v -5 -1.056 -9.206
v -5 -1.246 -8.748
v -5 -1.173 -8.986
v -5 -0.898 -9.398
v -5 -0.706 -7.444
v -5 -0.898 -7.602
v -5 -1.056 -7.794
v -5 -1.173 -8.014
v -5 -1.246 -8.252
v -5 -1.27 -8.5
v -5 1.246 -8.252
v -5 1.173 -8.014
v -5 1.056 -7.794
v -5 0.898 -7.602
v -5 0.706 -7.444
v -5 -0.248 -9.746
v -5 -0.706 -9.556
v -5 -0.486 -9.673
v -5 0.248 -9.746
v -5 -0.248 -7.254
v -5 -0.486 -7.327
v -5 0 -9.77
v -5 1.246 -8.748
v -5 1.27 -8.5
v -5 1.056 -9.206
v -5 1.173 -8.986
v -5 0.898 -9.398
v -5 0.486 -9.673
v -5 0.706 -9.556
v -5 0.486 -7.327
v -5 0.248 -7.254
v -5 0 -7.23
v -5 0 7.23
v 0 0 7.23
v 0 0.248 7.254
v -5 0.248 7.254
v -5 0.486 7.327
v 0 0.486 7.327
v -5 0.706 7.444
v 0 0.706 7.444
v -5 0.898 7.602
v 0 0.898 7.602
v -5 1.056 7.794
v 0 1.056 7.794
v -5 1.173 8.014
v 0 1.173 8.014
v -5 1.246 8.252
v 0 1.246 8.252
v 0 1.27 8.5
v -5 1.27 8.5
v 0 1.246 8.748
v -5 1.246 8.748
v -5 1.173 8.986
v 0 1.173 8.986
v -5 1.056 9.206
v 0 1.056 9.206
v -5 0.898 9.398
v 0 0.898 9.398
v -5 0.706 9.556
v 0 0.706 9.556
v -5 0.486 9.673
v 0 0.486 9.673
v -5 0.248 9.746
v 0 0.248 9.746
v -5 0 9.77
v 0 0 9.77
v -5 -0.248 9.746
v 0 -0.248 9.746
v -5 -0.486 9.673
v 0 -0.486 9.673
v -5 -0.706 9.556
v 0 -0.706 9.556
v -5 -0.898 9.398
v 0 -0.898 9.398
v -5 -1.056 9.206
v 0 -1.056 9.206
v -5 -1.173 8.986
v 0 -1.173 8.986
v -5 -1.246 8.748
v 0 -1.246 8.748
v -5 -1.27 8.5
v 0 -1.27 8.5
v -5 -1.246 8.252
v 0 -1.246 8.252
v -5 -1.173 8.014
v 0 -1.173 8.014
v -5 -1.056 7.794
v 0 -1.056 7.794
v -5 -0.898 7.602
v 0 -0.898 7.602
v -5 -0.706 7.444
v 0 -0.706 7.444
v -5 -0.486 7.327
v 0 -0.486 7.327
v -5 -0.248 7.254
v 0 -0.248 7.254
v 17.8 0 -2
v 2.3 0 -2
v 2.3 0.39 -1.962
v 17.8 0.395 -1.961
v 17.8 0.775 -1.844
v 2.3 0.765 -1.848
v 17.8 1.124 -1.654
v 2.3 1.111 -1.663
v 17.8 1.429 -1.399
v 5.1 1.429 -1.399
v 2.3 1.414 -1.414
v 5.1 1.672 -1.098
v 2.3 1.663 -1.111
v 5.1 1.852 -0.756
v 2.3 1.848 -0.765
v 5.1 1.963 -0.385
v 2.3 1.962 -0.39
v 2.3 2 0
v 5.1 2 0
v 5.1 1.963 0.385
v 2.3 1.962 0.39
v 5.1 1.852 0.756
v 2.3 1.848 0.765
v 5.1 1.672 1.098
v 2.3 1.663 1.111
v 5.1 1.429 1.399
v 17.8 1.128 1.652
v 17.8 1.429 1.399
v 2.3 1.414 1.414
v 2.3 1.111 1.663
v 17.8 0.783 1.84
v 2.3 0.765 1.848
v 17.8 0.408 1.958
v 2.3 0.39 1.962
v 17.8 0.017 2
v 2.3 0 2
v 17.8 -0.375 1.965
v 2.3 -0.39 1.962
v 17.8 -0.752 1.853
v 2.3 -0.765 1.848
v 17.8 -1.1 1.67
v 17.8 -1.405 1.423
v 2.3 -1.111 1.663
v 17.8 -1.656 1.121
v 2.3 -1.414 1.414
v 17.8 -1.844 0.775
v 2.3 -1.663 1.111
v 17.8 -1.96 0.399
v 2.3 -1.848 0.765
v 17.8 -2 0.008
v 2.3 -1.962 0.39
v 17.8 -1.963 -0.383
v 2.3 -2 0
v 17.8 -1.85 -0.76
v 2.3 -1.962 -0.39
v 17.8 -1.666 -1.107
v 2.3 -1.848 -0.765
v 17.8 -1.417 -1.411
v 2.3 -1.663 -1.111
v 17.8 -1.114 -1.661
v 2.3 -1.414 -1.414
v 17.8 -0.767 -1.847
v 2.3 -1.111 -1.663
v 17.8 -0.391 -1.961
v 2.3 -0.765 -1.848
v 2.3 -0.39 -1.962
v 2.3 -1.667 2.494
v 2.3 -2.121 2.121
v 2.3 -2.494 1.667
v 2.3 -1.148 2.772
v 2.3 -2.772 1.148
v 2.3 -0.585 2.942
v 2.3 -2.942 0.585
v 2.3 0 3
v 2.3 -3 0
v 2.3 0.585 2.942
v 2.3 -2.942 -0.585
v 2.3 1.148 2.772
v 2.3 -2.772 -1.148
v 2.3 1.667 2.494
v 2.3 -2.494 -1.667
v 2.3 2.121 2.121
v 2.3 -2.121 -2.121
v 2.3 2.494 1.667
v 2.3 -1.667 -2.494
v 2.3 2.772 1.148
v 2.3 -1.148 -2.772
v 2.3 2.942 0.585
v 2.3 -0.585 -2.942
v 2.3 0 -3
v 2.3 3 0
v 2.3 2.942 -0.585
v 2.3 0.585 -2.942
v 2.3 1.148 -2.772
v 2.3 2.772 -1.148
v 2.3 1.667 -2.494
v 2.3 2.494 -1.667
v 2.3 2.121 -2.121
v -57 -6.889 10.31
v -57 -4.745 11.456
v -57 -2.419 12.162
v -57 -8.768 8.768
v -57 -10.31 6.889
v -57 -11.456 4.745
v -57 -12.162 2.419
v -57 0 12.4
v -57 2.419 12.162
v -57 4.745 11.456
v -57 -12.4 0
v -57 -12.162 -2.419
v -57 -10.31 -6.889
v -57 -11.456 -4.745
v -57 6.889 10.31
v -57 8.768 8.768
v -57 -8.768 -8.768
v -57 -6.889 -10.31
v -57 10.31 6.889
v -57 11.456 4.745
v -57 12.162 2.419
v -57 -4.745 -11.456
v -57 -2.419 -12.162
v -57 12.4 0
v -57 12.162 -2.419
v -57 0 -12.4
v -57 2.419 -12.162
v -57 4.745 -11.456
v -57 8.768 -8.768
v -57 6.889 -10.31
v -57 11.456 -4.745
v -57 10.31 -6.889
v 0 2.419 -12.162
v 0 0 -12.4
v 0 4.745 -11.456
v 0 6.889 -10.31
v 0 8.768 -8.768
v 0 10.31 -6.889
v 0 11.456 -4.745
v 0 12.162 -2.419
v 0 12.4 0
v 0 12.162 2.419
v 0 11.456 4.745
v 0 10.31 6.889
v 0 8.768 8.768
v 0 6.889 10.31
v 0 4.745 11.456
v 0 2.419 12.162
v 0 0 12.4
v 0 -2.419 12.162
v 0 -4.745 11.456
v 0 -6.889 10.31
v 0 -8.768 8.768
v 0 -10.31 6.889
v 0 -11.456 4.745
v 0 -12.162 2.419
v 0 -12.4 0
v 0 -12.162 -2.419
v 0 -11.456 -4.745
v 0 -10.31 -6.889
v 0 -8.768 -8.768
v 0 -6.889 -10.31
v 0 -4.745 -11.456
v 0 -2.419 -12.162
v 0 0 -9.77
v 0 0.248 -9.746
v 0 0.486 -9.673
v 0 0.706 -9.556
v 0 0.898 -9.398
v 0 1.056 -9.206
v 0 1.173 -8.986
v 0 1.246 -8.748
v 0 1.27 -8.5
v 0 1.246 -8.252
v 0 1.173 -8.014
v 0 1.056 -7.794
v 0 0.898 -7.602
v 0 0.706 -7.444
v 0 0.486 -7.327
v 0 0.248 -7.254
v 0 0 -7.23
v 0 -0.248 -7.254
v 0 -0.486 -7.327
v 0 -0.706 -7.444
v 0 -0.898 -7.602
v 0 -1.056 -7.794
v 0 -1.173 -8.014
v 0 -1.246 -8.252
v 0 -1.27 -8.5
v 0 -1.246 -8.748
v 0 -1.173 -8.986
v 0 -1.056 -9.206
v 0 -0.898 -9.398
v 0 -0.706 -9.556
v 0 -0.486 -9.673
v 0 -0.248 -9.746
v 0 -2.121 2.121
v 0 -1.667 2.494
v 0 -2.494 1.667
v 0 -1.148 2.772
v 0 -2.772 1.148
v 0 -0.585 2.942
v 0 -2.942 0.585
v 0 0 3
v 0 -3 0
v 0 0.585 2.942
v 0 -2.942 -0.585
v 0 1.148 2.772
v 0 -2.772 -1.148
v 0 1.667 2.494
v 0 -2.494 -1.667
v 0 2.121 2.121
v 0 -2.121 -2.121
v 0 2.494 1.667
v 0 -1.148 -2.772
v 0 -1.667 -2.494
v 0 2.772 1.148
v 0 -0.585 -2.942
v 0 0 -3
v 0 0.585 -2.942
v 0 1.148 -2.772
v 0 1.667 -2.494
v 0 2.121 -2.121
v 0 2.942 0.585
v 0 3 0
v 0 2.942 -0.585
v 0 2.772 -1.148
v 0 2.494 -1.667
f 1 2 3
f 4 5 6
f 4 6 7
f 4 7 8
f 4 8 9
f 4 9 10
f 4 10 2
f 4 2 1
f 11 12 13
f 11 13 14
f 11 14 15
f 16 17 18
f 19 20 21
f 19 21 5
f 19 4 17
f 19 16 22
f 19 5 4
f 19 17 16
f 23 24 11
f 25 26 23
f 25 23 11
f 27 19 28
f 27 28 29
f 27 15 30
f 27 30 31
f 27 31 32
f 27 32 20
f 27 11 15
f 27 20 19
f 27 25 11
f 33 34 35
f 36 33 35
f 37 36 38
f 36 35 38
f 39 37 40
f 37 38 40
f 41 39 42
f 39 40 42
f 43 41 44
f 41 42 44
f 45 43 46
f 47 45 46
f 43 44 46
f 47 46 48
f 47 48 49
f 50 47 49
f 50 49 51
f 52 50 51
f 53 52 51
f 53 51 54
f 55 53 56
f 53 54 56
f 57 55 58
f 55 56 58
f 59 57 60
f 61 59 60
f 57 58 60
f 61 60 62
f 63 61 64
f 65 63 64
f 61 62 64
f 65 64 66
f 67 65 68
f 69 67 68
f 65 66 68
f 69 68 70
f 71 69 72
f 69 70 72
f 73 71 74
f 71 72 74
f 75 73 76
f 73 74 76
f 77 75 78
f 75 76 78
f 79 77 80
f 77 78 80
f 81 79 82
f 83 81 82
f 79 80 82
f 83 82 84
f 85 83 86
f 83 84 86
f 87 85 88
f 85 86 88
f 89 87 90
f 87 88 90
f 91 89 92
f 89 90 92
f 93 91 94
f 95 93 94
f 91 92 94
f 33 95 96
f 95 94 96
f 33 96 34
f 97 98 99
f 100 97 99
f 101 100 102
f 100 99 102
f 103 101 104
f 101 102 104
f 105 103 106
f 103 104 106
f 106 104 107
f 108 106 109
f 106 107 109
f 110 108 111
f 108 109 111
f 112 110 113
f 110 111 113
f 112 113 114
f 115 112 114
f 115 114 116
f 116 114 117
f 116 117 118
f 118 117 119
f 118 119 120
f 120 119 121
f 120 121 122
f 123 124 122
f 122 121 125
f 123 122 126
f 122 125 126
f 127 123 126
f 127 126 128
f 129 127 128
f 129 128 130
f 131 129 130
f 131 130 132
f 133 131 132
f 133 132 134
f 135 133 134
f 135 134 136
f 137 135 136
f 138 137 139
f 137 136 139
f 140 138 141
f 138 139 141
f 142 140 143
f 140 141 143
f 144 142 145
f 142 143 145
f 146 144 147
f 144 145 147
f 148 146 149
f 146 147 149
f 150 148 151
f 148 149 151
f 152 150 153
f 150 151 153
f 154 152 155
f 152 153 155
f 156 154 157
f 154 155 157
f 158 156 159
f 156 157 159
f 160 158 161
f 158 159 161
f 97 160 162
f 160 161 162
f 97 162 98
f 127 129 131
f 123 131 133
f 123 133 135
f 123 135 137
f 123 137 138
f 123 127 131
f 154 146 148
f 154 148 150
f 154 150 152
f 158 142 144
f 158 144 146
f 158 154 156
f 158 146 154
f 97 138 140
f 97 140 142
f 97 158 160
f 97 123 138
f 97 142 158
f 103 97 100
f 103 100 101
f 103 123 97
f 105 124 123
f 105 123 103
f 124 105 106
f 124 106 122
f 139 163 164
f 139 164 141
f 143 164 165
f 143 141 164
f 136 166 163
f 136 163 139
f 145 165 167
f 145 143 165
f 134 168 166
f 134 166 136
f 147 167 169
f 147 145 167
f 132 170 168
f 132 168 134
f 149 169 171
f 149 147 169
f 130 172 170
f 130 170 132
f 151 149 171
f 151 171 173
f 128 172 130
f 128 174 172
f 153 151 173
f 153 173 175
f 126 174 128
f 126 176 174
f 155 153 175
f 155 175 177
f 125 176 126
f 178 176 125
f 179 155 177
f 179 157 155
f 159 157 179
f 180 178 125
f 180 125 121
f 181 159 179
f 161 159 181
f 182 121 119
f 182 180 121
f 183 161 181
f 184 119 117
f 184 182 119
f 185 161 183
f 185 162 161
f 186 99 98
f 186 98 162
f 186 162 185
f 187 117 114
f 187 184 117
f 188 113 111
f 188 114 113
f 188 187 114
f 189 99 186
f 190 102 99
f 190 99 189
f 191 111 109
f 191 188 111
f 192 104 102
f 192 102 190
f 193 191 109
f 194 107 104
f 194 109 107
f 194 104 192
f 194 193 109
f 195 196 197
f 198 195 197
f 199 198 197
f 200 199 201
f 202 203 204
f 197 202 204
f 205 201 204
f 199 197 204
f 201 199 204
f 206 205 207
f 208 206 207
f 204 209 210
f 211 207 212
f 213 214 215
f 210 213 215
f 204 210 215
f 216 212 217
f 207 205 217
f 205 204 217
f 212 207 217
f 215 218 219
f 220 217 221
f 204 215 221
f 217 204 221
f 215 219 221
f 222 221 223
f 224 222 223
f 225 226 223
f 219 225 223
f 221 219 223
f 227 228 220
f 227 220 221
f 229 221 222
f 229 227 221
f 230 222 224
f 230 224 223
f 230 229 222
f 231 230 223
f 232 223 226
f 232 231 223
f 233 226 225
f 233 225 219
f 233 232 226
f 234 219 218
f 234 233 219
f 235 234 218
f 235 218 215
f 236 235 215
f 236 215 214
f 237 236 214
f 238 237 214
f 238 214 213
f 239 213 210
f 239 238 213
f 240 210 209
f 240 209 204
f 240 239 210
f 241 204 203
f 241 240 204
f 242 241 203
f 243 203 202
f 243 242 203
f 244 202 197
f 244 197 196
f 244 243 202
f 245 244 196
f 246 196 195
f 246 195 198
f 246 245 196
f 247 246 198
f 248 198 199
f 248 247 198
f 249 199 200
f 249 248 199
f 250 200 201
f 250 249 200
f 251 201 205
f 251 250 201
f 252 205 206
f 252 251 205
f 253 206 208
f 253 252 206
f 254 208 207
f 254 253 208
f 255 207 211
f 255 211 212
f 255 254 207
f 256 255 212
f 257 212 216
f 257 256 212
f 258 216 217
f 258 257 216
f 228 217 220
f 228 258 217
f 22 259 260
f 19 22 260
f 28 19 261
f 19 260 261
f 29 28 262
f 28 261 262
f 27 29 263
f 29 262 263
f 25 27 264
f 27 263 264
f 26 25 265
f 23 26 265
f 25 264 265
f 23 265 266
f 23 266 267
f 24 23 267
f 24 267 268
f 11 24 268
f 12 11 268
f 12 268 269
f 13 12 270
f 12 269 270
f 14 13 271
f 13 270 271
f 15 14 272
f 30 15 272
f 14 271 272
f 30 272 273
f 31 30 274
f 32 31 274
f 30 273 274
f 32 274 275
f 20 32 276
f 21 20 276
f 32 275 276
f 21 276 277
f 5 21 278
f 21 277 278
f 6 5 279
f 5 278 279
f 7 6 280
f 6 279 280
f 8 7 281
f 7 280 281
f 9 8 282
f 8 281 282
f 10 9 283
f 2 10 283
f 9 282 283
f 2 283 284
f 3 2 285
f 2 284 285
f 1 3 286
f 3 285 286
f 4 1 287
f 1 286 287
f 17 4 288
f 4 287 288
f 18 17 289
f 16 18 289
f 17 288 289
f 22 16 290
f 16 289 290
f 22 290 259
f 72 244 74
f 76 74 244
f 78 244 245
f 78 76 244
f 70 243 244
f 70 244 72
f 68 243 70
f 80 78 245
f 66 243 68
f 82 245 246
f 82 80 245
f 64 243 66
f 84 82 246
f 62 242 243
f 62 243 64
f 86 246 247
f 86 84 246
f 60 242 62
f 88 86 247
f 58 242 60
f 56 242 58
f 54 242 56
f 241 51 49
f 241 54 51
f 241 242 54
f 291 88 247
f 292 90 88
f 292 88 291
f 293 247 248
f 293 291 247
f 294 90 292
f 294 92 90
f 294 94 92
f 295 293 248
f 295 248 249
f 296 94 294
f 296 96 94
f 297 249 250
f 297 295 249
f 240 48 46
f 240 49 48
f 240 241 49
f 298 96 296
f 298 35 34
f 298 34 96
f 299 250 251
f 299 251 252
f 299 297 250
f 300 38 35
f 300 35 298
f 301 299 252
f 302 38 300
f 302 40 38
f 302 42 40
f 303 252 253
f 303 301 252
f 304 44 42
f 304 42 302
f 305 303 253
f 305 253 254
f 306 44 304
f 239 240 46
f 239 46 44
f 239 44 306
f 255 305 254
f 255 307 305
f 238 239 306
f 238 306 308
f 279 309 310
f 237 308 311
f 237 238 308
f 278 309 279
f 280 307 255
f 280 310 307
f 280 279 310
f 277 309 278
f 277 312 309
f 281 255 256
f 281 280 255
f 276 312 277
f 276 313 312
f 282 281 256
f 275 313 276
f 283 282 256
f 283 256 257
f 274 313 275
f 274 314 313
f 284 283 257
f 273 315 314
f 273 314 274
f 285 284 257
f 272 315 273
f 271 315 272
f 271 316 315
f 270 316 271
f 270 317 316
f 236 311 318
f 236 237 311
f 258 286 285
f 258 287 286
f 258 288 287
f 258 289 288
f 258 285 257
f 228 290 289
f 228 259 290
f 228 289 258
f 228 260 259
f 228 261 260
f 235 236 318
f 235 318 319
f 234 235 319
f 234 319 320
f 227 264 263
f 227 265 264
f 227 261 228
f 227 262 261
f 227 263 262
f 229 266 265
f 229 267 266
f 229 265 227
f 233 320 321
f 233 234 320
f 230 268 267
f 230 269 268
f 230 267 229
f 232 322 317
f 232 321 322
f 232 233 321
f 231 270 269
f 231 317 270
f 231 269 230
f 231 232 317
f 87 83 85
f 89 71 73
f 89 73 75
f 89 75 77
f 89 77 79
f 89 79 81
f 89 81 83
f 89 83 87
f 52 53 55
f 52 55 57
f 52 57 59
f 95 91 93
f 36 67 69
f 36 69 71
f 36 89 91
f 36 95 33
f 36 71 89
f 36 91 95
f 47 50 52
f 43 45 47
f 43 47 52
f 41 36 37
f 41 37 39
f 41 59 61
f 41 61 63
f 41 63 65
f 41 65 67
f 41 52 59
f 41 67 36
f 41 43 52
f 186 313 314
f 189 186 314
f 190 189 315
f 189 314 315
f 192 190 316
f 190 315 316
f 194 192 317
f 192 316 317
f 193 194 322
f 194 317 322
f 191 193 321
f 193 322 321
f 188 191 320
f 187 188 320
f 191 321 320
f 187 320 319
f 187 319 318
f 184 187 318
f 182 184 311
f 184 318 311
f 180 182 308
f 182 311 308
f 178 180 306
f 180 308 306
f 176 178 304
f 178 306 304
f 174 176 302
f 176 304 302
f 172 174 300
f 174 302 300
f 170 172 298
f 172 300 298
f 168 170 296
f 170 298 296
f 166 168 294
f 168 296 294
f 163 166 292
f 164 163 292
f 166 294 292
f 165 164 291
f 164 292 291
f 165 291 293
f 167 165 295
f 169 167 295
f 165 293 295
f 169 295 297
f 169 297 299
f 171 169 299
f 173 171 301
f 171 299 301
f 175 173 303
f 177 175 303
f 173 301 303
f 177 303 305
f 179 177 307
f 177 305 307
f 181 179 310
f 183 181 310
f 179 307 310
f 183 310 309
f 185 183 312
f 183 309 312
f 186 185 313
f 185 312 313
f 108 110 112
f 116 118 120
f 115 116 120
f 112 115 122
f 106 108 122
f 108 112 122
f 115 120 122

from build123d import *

# Parameters (mm, degrees)
SKETCH1_R           = 12.4
BOSS_EXTRUDE1_DEPTH = 57
SKETCH2_R           = 3
BOSS_EXTRUDE2_DEPTH = 2.3
SKETCH3_R           = 2
BOSS_EXTRUDE3_DEPTH = 15.5
SKETCH4_R           = 1.27
CUT_EXTRUDE1_DEPTH  = 5
CUT_EXTRUDE3_DEPTH  = 12.7


with BuildPart() as part:
    # Sketch1 → Boss-Extrude1 (new body)
    with BuildSketch(Plane(origin=(0, 0, 0), x_dir=(0, 0, -1), z_dir=(1, 0, 0))):
        Circle(SKETCH1_R)
    extrude(amount=-BOSS_EXTRUDE1_DEPTH)

    # Sketch2 → Boss-Extrude2 (add)
    with BuildSketch(Plane(origin=(0, 0, 0), x_dir=(0, 0, -1), z_dir=(1, 0, 0))):
        Circle(SKETCH2_R)
    extrude(amount=BOSS_EXTRUDE2_DEPTH)

    # Sketch3 → Boss-Extrude3 (add)
    with BuildSketch(Plane(origin=(2.3, 0, 0), x_dir=(0, 0, -1), z_dir=(1, 0, 0))):
        Circle(SKETCH3_R)
    extrude(amount=BOSS_EXTRUDE3_DEPTH)

    # Sketch4 → Cut-Extrude1 (cut)
    with BuildSketch(Plane(origin=(0, 0, 0), x_dir=(0, 0, -1), z_dir=(1, 0, 0))):
        with Locations((8.5, 0)):
            Circle(SKETCH4_R)
        with Locations((-8.5, 0)):
            Circle(SKETCH4_R)
    extrude(amount=-CUT_EXTRUDE1_DEPTH, mode=Mode.SUBTRACT)

    # Sketch5 → Cut-Extrude3 (cut)
    with BuildSketch(Plane(origin=(17.8, 0, 0), x_dir=(0, 0, -1), z_dir=(1, 0, 0))):
        with BuildLine():
            Line((0, 1.429), (-1.399270882, 1.429))
            ThreePointArc((-1.399270882, 1.429), (0, 2), (1.399270882, 1.429))
            Line((1.399270882, 1.429), (0, 1.429))
        make_face()
    extrude(amount=-CUT_EXTRUDE3_DEPTH, mode=Mode.SUBTRACT)


solid = part.part
